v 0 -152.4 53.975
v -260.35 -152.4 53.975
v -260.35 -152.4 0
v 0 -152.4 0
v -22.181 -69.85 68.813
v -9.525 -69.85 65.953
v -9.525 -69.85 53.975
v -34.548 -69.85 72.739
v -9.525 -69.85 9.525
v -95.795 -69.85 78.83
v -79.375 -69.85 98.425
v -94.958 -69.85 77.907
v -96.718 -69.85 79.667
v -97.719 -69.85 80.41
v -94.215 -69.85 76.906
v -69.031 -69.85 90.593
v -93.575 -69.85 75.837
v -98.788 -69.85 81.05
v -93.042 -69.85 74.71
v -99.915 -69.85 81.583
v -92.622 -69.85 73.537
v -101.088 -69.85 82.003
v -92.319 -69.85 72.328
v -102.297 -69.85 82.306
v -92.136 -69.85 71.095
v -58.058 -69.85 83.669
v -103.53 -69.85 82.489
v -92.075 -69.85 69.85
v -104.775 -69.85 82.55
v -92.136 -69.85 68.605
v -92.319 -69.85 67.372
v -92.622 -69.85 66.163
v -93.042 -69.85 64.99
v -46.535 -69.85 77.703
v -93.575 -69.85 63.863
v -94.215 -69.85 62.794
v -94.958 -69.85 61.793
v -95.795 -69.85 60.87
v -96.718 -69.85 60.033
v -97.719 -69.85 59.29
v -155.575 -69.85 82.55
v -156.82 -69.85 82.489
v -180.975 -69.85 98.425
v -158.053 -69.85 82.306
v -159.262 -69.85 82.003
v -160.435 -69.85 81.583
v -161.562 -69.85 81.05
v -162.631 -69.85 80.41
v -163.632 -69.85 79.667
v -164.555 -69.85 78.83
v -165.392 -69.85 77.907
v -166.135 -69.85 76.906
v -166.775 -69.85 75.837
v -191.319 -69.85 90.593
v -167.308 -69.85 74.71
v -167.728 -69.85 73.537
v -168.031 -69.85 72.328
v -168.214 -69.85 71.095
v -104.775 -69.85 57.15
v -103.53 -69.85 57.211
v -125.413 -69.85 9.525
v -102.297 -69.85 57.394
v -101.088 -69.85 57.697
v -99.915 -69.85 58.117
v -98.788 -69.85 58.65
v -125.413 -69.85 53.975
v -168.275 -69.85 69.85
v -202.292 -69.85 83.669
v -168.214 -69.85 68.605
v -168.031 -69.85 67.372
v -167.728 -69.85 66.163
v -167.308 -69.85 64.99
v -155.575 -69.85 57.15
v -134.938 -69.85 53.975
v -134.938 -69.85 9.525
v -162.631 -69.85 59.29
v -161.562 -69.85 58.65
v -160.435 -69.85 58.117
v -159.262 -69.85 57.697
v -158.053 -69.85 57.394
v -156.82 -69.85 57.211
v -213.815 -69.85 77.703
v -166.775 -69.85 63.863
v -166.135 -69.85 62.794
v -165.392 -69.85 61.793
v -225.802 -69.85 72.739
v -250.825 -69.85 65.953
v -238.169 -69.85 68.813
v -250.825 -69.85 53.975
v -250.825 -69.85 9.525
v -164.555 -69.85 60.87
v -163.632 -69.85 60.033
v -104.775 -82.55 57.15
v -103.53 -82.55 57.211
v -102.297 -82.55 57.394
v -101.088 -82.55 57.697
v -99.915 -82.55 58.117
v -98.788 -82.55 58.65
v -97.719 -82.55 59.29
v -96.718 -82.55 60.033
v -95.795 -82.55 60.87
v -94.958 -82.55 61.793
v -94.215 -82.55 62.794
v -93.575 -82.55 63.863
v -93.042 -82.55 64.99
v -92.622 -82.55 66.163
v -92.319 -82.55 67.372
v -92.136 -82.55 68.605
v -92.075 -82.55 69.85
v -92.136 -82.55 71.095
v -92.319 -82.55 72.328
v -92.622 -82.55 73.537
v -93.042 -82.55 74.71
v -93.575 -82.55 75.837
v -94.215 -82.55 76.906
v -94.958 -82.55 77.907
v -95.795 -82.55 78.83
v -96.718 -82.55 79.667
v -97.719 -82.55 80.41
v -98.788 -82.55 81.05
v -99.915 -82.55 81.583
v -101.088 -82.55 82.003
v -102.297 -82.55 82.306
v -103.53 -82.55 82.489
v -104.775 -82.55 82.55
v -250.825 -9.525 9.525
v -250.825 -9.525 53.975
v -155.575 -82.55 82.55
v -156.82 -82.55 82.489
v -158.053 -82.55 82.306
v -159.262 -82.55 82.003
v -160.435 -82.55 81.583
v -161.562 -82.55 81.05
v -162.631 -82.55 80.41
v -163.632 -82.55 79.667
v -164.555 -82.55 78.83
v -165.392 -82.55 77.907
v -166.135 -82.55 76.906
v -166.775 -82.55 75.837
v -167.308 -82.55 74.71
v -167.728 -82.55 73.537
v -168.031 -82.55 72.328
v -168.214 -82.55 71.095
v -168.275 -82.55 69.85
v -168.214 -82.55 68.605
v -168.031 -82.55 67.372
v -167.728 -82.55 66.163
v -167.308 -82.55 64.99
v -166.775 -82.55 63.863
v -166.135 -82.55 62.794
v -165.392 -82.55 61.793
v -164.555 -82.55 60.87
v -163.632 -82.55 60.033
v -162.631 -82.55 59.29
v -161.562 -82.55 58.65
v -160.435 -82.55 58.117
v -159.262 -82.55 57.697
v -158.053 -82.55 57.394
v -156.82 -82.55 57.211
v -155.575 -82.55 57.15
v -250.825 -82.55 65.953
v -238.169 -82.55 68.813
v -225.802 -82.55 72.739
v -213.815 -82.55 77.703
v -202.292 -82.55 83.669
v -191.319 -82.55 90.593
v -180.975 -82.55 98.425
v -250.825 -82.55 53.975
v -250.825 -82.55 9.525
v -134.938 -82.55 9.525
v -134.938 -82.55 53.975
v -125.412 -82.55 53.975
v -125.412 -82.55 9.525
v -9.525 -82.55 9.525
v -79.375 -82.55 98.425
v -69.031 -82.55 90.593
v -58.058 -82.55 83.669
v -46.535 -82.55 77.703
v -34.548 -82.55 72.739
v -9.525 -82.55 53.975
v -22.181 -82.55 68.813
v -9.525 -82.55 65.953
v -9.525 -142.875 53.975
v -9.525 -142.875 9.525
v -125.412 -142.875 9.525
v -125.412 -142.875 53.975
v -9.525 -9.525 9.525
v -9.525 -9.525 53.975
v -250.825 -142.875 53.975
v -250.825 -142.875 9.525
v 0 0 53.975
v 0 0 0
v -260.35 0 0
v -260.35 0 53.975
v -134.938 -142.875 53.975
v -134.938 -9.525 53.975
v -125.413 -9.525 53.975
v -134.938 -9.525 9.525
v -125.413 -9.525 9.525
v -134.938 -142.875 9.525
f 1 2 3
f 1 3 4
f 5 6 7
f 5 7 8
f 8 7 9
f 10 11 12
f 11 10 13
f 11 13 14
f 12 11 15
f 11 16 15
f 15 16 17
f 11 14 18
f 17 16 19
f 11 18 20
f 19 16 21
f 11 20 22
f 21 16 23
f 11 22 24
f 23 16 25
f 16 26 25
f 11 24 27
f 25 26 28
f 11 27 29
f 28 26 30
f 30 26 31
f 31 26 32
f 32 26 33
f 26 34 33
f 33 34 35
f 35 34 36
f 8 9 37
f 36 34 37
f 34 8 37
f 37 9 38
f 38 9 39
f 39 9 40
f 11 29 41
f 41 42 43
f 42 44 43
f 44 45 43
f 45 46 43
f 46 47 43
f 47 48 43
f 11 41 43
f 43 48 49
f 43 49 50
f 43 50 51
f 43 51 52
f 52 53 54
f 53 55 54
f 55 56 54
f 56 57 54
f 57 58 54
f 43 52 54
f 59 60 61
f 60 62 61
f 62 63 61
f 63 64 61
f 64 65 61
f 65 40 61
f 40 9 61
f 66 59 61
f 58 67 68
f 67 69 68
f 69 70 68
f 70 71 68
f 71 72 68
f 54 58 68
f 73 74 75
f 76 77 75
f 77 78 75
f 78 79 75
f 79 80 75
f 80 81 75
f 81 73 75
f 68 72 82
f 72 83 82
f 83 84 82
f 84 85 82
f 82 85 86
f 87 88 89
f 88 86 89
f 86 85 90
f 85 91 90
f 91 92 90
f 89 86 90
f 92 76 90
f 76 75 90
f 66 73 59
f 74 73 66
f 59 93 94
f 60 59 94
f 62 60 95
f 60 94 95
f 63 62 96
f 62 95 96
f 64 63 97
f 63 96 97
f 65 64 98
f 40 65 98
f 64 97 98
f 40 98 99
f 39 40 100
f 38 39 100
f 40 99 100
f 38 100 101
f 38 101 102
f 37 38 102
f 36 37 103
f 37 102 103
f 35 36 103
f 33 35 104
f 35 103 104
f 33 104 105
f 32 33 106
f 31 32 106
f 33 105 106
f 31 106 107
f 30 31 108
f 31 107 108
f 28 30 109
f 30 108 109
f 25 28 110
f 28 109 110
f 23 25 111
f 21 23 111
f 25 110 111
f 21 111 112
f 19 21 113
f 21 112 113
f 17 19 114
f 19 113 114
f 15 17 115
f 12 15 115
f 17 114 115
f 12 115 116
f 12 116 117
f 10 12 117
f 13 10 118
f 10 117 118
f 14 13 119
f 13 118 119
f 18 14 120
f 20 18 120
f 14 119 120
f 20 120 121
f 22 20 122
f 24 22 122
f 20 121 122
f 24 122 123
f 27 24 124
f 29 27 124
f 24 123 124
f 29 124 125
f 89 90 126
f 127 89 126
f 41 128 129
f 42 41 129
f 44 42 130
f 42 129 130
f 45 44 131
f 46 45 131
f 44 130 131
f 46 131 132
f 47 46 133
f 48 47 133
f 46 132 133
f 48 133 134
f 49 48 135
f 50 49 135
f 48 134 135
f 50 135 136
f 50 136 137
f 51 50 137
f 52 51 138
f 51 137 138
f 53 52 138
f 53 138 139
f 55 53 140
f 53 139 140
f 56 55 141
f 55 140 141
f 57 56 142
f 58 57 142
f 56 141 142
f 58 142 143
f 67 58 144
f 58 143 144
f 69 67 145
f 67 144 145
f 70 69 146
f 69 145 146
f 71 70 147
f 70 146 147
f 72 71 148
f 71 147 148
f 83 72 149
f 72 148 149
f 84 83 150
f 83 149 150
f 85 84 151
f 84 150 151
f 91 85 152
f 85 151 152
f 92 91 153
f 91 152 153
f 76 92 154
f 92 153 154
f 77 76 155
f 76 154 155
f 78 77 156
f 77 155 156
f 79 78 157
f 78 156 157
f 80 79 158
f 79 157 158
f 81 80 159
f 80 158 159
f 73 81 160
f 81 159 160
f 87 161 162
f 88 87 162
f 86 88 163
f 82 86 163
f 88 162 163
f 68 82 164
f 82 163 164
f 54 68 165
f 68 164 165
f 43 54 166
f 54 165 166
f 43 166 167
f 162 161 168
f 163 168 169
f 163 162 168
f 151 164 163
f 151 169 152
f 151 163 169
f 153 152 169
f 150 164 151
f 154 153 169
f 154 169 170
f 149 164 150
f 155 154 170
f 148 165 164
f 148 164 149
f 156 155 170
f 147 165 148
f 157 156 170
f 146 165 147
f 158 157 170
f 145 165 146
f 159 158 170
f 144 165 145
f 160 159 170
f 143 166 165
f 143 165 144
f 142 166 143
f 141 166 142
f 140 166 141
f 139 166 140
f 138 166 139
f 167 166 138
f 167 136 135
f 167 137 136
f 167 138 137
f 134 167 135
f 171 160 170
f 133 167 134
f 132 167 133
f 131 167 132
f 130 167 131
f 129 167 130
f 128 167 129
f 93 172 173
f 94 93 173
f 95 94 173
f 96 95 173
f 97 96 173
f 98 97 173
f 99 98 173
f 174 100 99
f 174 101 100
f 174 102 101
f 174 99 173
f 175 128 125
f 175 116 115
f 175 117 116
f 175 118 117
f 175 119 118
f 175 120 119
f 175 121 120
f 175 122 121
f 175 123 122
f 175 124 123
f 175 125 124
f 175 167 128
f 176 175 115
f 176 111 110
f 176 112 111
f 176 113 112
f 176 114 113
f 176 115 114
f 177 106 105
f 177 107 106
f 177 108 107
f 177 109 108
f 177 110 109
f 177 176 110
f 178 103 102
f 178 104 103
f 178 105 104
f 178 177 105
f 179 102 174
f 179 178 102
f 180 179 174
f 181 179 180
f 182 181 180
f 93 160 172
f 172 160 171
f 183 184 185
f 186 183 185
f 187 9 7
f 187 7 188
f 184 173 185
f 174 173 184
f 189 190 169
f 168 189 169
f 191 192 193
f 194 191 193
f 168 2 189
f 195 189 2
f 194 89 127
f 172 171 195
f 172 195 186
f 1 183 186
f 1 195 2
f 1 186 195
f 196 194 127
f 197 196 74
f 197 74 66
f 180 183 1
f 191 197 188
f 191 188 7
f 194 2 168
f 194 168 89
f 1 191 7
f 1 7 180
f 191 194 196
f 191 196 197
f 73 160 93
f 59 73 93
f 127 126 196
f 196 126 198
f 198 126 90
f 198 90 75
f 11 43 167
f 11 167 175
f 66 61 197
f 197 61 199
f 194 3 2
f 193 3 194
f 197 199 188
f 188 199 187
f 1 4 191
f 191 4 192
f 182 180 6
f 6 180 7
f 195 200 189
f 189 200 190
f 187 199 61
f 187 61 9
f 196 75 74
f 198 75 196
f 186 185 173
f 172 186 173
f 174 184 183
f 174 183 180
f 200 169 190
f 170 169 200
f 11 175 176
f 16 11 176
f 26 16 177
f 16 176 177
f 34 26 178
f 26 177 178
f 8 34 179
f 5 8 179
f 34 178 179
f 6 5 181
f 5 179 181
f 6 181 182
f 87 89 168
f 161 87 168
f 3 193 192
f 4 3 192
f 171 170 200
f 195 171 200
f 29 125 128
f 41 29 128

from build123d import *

# Parameters (mm, degrees)
F0_W      = 260.35
F0_H      = 9.525
F1_DEPTH  = 152.4
F3_DEPTH  = 44.45
F4_W      = 9.525
F4_H      = 133.35
F5_DEPTH  = 44.45
F7_DEPTH  = 44.45
F9_DEPTH  = 88.9
F11_DEPTH = 25.4
F12_DEPTH = 25.4
F14_DEPTH = 12.7
F15_W     = 9.525
F15_H     = 60.325
F16_DEPTH = 44.45


with BuildPart() as f1:
    # F0 (on Front) → F1 (new body)
    with BuildSketch(Plane.XZ):
        with Locations((-130.175, 4.7625)):
            Rectangle(F0_W, F0_H)
    extrude(amount=F1_DEPTH)

    # F2 (on face) → F3 (join)
    with BuildSketch(Plane.XY.offset(9.525)):
        Polygon((-260.35, 0), (-260.35, -9.525), (-248.4708428383, -9.525), (0, -9.525), (0, 0), align=None)
        Polygon((-260.35, -152.4), (-250.825, -152.4), (0, -152.4), (0, -142.875), (-260.35, -142.875), align=None)
    extrude(amount=F3_DEPTH)

    # F4 (on face) → F5 (join)
    with BuildSketch(Plane.XY.offset(9.525)):
        with Locations((-255.5875, -76.2)):
            Rectangle(F4_W, F4_H)
        with Locations((-4.7625, -76.2)):
            Rectangle(F4_W, F4_H)
    extrude(amount=F5_DEPTH)

    # F6 (on face) → F7 (join)
    with BuildSketch(Plane.XY.offset(9.525)):
        Polygon((-134.9375, -82.55), (-134.9375, -142.875), (-130.175, -142.875), (-125.4125, -142.875), (-125.4125, -82.55), align=None)
    extrude(amount=F7_DEPTH)

    # F8 (on face) → F9 (join)
    with BuildSketch(Plane.XY.offset(9.525)):
        Polygon((-250.825, -69.85), (-250.825, -82.55), (-134.9375, -82.55), (-125.4125, -82.55), (-9.525, -82.55), (-9.525, -69.85), align=None)
    extrude(amount=F9_DEPTH)

    # F10 (on face) → F11 (join)
    with BuildSketch(Plane.XZ.offset(82.55)):
        with BuildLine():
            Line((-180.975, 98.425), (-250.825, 98.425))
            Line((-250.825, 98.425), (-250.825, 65.953187989))
            ThreePointArc((-250.825, 65.953187989), (-213.8145902973, 77.7031765567), (-180.975, 98.425))
        make_face()
        with BuildLine():
            Line((-250.825, 65.953187989), (-250.825, 98.425))
            Line((-250.825, 98.425), (-180.975, 98.425))
            ThreePointArc((-180.975, 98.425), (-149.1074694289, 134.677129134), (-130.175, 179.0766558518))
            ThreePointArc((-130.175, 179.0766558518), (-134.6905811935, 215.9), (-130.175, 252.7233441482))
            ThreePointArc((-130.175, 252.7233441482), (-406.0727955672, 298.5942281561), (-250.825, 65.953187989))
        make_face()
        with BuildLine():
            ThreePointArc((-125.6594188065, 215.9), (-126.7925264835, 234.44958994), (-130.175, 252.7233441482))
            ThreePointArc((-130.175, 252.7233441482), (-134.6905811935, 215.9), (-130.175, 179.0766558518))
            ThreePointArc((-130.175, 179.0766558518), (-126.7925264835, 197.35041006), (-125.6594188065, 215.9))
        make_face()
        with BuildLine():
            ThreePointArc((170.1094188065, 215.9), (36.2590087465, 367.166892323), (-130.175, 252.7233441482))
            ThreePointArc((-130.175, 252.7233441482), (-126.7925264835, 234.44958994), (-125.6594188065, 215.9))
            ThreePointArc((-125.6594188065, 215.9), (-126.7925264835, 197.35041006), (-130.175, 179.0766558518))
            ThreePointArc((-130.175, 179.0766558518), (-111.2425305711, 134.677129134), (-79.375, 98.425))
            ThreePointArc((-79.375, 98.425), (82.632814335, 78.0206588605), (170.1094188065, 215.9))
        make_face()
    extrude(amount=-F11_DEPTH)

    # F10 (on face) → F12 (cut)
    with BuildSketch(Plane.XZ.offset(82.55)):
        with BuildLine():
            Line((-180.975, 98.425), (-250.825, 98.425))
            Line((-250.825, 98.425), (-250.825, 65.953187989))
            ThreePointArc((-250.825, 65.953187989), (-213.8145902973, 77.7031765567), (-180.975, 98.425))
        make_face()
        with BuildLine():
            Line((-250.825, 65.953187989), (-250.825, 98.425))
            Line((-250.825, 98.425), (-180.975, 98.425))
            ThreePointArc((-180.975, 98.425), (-149.1074694289, 134.677129134), (-130.175, 179.0766558518))
            ThreePointArc((-130.175, 179.0766558518), (-134.6905811935, 215.9), (-130.175, 252.7233441482))
            ThreePointArc((-130.175, 252.7233441482), (-406.0727955672, 298.5942281561), (-250.825, 65.953187989))
        make_face()
        with BuildLine():
            ThreePointArc((-125.6594188065, 215.9), (-126.7925264835, 234.44958994), (-130.175, 252.7233441482))
            ThreePointArc((-130.175, 252.7233441482), (-134.6905811935, 215.9), (-130.175, 179.0766558518))
            ThreePointArc((-130.175, 179.0766558518), (-126.7925264835, 197.35041006), (-125.6594188065, 215.9))
        make_face()
        with BuildLine():
            ThreePointArc((170.1094188065, 215.9), (36.2590087465, 367.166892323), (-130.175, 252.7233441482))
            ThreePointArc((-130.175, 252.7233441482), (-126.7925264835, 234.44958994), (-125.6594188065, 215.9))
            ThreePointArc((-125.6594188065, 215.9), (-126.7925264835, 197.35041006), (-130.175, 179.0766558518))
            ThreePointArc((-130.175, 179.0766558518), (-111.2425305711, 134.677129134), (-79.375, 98.425))
            ThreePointArc((-79.375, 98.425), (82.632814335, 78.0206588605), (170.1094188065, 215.9))
        make_face()
    extrude(amount=-F12_DEPTH, mode=Mode.SUBTRACT)

    # F13 (on face) → F14 (cut)
    with BuildSketch(Plane.XZ.offset(82.55)):
        with BuildLine():
            Line((-104.775, 82.55), (-155.575, 82.55))
            ThreePointArc((-155.575, 82.55), (-168.275, 69.85), (-155.575, 57.15))
            Line((-155.575, 57.15), (-104.775, 57.15))
            ThreePointArc((-104.775, 57.15), (-92.075, 69.85), (-104.775, 82.55))
        make_face()
    extrude(amount=-F14_DEPTH, mode=Mode.SUBTRACT)

    # F15 (on face) → F16 (join)
    with BuildSketch(Plane.XY.offset(9.525)):
        with Locations((-130.175, -39.6875)):
            Rectangle(F15_W, F15_H)
    extrude(amount=F16_DEPTH)


solid = f1.part
